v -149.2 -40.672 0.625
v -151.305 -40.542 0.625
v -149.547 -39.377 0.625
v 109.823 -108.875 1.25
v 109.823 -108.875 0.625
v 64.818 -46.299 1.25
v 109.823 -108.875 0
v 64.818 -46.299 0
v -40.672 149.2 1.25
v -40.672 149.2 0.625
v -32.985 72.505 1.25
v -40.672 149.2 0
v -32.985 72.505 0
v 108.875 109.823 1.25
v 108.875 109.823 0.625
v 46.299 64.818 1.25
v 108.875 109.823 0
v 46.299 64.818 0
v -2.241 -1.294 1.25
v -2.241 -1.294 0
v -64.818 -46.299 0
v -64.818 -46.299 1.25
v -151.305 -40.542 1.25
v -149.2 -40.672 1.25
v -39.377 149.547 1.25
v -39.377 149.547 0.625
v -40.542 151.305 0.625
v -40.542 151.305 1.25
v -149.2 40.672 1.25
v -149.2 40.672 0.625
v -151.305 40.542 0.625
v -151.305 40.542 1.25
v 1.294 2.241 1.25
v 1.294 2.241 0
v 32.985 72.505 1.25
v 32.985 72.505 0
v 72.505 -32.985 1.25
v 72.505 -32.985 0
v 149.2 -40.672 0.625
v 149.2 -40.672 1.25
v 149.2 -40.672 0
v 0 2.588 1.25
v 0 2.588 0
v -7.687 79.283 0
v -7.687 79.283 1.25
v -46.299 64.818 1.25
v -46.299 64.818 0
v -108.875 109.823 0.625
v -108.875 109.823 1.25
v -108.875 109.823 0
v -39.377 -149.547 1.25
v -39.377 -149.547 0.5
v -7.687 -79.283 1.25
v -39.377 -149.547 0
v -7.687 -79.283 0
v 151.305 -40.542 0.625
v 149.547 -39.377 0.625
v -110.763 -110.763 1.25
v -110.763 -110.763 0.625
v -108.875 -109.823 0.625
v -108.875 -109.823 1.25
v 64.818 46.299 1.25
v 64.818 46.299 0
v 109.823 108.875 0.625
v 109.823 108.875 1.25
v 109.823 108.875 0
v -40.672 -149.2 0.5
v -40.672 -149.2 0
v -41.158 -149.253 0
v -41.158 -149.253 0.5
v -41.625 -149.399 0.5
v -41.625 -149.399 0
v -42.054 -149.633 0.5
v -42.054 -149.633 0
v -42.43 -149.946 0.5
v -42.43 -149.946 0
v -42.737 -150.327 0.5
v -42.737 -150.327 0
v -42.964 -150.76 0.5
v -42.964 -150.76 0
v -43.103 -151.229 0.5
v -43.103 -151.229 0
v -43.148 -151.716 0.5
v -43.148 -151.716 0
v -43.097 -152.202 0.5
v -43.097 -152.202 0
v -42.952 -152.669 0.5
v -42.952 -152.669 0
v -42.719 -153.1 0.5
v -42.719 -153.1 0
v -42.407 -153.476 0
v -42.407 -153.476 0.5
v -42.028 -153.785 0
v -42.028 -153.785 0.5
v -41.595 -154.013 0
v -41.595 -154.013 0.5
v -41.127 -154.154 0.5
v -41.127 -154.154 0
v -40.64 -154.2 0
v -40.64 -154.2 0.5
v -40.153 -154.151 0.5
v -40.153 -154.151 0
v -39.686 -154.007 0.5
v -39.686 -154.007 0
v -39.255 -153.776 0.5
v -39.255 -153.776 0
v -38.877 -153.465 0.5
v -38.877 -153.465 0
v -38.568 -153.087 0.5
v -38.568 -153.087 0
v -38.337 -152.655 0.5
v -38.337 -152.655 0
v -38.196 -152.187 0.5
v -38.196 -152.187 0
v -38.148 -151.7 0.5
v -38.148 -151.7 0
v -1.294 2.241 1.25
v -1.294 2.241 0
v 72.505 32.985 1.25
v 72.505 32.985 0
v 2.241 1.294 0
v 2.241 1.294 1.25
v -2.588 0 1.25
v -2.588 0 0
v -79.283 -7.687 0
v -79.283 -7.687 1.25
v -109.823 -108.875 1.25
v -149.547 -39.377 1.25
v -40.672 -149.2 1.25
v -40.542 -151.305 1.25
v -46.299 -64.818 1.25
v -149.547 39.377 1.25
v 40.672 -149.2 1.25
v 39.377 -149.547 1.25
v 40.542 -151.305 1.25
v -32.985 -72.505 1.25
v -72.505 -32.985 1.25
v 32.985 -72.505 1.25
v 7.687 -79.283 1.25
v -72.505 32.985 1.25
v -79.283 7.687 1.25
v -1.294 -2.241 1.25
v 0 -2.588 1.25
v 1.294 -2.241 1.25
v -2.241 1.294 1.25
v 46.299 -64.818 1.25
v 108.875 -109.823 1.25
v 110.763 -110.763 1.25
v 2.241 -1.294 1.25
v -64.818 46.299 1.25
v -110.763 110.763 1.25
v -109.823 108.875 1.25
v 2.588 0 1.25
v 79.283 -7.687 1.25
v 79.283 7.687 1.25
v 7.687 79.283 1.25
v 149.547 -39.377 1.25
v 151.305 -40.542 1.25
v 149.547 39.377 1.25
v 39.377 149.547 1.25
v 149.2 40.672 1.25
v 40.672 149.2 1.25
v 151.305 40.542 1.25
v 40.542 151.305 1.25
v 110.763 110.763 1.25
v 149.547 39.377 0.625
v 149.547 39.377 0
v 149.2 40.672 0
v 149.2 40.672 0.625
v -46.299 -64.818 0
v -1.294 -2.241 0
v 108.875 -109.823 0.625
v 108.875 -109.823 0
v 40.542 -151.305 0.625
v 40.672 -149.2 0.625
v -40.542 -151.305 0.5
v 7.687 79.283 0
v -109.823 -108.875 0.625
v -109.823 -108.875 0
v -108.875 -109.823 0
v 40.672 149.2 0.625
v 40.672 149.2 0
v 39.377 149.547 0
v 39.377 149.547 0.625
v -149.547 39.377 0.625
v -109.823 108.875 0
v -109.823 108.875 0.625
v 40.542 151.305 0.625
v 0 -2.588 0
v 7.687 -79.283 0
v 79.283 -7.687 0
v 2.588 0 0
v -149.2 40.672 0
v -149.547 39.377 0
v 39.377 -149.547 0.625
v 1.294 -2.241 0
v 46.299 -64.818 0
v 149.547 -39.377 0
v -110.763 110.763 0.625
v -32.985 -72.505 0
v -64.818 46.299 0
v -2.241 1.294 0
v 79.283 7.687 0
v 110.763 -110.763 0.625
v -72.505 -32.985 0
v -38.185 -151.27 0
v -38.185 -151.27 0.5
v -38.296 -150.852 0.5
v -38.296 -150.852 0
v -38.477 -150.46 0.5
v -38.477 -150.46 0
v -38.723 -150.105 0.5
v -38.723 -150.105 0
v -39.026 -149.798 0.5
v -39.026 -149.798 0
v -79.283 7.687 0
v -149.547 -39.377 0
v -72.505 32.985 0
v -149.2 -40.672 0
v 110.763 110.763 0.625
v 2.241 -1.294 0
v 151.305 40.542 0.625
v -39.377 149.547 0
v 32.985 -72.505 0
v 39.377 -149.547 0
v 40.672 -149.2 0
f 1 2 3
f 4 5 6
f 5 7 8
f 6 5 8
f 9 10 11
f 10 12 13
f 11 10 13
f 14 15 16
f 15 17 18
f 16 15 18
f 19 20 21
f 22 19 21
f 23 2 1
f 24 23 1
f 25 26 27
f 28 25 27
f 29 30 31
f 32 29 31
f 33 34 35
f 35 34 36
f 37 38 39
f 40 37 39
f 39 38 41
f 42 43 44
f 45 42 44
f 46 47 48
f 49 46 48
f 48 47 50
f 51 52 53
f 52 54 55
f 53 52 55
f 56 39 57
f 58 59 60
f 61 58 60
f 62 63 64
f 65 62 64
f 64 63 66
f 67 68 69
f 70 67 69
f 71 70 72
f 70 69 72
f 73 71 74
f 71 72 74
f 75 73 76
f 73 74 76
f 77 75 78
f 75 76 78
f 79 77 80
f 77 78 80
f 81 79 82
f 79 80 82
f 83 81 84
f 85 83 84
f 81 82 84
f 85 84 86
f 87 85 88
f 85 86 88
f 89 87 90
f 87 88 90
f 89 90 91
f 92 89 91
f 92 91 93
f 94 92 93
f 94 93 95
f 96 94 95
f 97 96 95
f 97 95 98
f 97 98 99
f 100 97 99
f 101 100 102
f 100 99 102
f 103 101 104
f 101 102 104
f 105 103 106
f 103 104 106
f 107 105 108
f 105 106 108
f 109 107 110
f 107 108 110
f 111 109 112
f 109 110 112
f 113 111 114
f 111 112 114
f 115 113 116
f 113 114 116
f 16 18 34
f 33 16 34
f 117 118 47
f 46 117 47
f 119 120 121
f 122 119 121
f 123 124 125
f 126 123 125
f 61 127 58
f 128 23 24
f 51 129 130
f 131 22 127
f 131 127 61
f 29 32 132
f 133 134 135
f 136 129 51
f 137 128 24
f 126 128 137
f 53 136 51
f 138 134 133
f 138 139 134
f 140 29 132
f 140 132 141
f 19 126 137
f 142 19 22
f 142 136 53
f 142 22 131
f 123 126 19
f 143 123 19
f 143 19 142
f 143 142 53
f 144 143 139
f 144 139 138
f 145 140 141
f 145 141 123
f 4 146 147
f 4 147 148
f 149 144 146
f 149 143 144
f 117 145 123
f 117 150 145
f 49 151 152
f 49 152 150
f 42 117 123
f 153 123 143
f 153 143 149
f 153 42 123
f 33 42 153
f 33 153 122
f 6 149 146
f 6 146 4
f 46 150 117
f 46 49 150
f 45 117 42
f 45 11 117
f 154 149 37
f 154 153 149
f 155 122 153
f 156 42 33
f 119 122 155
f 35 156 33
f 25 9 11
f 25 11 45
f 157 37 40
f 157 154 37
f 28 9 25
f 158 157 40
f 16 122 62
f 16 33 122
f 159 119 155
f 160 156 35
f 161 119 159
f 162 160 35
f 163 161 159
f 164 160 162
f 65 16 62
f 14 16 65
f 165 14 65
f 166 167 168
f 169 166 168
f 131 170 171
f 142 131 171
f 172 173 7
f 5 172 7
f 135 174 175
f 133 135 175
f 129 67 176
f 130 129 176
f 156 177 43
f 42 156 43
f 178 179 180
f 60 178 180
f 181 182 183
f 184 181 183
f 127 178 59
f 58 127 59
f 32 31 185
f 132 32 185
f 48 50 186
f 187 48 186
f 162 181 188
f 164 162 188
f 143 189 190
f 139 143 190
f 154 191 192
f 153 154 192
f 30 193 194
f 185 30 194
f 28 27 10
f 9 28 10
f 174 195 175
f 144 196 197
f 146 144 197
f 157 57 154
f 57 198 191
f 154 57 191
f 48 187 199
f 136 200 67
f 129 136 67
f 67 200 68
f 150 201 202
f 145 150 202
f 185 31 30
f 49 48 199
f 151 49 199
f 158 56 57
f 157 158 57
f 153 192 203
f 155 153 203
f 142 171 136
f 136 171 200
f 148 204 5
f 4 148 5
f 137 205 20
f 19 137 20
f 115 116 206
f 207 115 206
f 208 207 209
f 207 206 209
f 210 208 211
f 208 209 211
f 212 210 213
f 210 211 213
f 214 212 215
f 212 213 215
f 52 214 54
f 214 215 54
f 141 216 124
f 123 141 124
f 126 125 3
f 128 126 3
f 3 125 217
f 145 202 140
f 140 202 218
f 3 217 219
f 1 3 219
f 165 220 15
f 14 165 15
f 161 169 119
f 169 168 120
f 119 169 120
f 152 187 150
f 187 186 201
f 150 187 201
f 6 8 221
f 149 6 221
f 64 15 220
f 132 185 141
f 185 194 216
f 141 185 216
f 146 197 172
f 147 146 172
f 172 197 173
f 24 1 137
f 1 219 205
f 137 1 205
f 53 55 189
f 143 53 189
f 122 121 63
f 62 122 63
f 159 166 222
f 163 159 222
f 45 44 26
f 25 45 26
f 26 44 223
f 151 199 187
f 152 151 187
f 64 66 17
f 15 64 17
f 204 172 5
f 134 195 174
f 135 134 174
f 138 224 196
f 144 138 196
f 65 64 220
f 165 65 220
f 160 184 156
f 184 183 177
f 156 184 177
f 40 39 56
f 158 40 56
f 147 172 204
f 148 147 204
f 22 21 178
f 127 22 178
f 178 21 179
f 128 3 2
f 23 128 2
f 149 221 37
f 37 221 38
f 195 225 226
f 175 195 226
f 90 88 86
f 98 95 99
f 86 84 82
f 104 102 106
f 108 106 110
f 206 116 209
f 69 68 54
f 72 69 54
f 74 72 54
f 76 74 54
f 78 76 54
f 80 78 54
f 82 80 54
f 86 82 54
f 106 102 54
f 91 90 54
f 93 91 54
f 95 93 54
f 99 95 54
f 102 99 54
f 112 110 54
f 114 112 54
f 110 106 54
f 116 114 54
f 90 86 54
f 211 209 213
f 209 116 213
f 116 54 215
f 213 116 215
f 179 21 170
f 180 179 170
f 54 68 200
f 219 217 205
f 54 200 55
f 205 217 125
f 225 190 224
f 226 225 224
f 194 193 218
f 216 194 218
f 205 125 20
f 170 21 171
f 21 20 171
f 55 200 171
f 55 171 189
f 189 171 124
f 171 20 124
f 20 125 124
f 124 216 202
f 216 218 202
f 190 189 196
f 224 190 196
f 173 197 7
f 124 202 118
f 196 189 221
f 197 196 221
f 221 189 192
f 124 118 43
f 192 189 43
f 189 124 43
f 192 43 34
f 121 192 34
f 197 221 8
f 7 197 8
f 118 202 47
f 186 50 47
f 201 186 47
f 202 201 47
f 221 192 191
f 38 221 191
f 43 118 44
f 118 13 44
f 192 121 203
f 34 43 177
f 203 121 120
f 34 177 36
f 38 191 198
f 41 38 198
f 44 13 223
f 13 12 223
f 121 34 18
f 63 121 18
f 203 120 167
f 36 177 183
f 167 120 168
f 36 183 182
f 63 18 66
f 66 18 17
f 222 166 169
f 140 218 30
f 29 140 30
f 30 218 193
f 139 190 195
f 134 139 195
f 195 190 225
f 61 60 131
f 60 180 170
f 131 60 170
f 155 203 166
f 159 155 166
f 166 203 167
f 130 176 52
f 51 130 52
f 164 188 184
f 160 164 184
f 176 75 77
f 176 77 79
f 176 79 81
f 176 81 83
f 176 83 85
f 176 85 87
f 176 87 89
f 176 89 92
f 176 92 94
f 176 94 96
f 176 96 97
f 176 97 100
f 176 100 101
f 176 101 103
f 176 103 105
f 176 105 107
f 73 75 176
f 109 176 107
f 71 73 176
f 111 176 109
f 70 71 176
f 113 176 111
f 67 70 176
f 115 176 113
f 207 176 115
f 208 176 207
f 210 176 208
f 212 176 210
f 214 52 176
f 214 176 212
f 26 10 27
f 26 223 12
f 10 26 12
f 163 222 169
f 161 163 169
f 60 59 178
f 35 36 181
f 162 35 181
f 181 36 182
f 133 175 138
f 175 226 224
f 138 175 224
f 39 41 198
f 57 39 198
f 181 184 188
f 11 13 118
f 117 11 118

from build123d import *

# Parameters (mm, degrees)
F0_DEPTH = 1.25
F4_DEPTH = 0.5
F1_DEPTH = 0.625


with BuildPart() as f0:
    # F2 (on Top) → F0 (new body)
    with BuildSketch(Plane.XY):
        with BuildLine():
            ThreePointArc((2.2414386804, -1.2940952255), (2.5, -0.6698729811), (2.588190451, 0))
            ThreePointArc((2.588190451, 0), (2.5, 0.6698729811), (2.2414386804, 1.2940952255))
            ThreePointArc((2.2414386804, 1.2940952255), (1.8301270189, 1.8301270189), (1.2940952255, 2.2414386804))
            ThreePointArc((1.2940952255, 2.2414386804), (0.6698729811, 2.5), (0, 2.588190451))
            ThreePointArc((0, 2.588190451), (-0.6698729811, 2.5), (-1.2940952255, 2.2414386804))
            ThreePointArc((-1.2940952255, 2.2414386804), (-1.8301270189, 1.8301270189), (-2.2414386804, 1.2940952255))
            ThreePointArc((-2.2414386804, 1.2940952255), (-2.5, 0.6698729811), (-2.588190451, 0))
            Line((-2.588190451, 0), (0, 0))
            Line((0, 0), (0, -2.588190451))
            ThreePointArc((0, -2.588190451), (0.6698729811, -2.5), (1.2940952255, -2.2414386804))
            ThreePointArc((1.2940952255, -2.2414386804), (1.8301270189, -1.8301270189), (2.2414386804, -1.2940952255))
        make_face()
        with BuildLine():
            Line((79.283469064, -7.6867534323), (2.588190451, 0))
            ThreePointArc((2.588190451, 0), (2.5, -0.6698729811), (2.2414386804, -1.2940952255))
            Line((2.2414386804, -1.2940952255), (72.5048750257, -32.984810787))
            Line((72.5048750257, -32.984810787), (149.2001536387, -40.6715642193))
            Line((149.2001536387, -40.6715642193), (151.3053811766, -40.5421546968))
            Line((151.3053811766, -40.5421546968), (149.5469054093, -39.3774689938))
            Line((149.5469054093, -39.3774689938), (79.283469064, -7.6867534323))
        make_face()
        with BuildLine():
            ThreePointArc((2.2414386804, 1.2940952255), (2.5, 0.6698729811), (2.588190451, 0))
            Line((2.588190451, 0), (79.283469064, 7.6867534323))
            Line((79.283469064, 7.6867534323), (149.5469054093, 39.3774689938))
            Line((149.5469054093, 39.3774689938), (151.3053811766, 40.5421546968))
            Line((151.3053811766, 40.5421546968), (149.2001536387, 40.6715642193))
            Line((149.2001536387, 40.6715642193), (72.5048750257, 32.984810787))
            Line((72.5048750257, 32.984810787), (2.2414386804, 1.2940952255))
        make_face()
        with BuildLine():
            ThreePointArc((1.2940952255, 2.2414386804), (1.8301270189, 1.8301270189), (2.2414386804, 1.2940952255))
            Line((2.2414386804, 1.2940952255), (64.8181215934, 46.298658277))
            Line((64.8181215934, 46.298658277), (109.8226846449, 108.87534119))
            Line((109.8226846449, 108.87534119), (110.7632264798, 110.7632264798))
            Line((110.7632264798, 110.7632264798), (108.87534119, 109.8226846449))
            Line((108.87534119, 109.8226846449), (46.298658277, 64.8181215934))
            Line((46.298658277, 64.8181215934), (1.2940952255, 2.2414386804))
        make_face()
        with BuildLine():
            Line((64.8181215934, -46.298658277), (2.2414386804, -1.2940952255))
            ThreePointArc((2.2414386804, -1.2940952255), (1.8301270189, -1.8301270189), (1.2940952255, -2.2414386804))
            Line((1.2940952255, -2.2414386804), (46.298658277, -64.8181215934))
            Line((46.298658277, -64.8181215934), (108.87534119, -109.8226846449))
            Line((108.87534119, -109.8226846449), (110.7632264798, -110.7632264798))
            Line((110.7632264798, -110.7632264798), (109.8226846449, -108.87534119))
            Line((109.8226846449, -108.87534119), (64.8181215934, -46.298658277))
        make_face()
        with BuildLine():
            ThreePointArc((0, 2.588190451), (0.6698729811, 2.5), (1.2940952255, 2.2414386804))
            Line((1.2940952255, 2.2414386804), (32.984810787, 72.5048750257))
            Line((32.984810787, 72.5048750257), (40.6715642193, 149.2001536387))
            Line((40.6715642193, 149.2001536387), (40.5421546968, 151.3053811766))
            Line((40.5421546968, 151.3053811766), (39.3774689938, 149.5469054093))
            Line((39.3774689938, 149.5469054093), (7.6867534323, 79.283469064))
            Line((7.6867534323, 79.283469064), (0, 2.588190451))
        make_face()
        with BuildLine():
            Line((32.984810787, -72.5048750257), (1.2940952255, -2.2414386804))
            ThreePointArc((1.2940952255, -2.2414386804), (0.6698729811, -2.5), (0, -2.588190451))
            Line((0, -2.588190451), (7.6867534323, -79.283469064))
            Line((7.6867534323, -79.283469064), (39.3774689938, -149.5469054093))
            Line((39.3774689938, -149.5469054093), (40.5421546968, -151.3053811766))
            Line((40.5421546968, -151.3053811766), (40.6715642193, -149.2001536387))
            Line((40.6715642193, -149.2001536387), (32.984810787, -72.5048750257))
        make_face()
        with BuildLine():
            ThreePointArc((-1.2940952255, 2.2414386804), (-0.6698729811, 2.5), (0, 2.588190451))
            Line((0, 2.588190451), (-7.6867534323, 79.283469064))
            Line((-7.6867534323, 79.283469064), (-39.3774689938, 149.5469054093))
            Line((-39.3774689938, 149.5469054093), (-40.5421546968, 151.3053811766))
            Line((-40.5421546968, 151.3053811766), (-40.6715642193, 149.2001536387))
            Line((-40.6715642193, 149.2001536387), (-32.984810787, 72.5048750257))
            Line((-32.984810787, 72.5048750257), (-1.2940952255, 2.2414386804))
        make_face()
        with BuildLine():
            Line((-7.6867534323, -79.283469064), (0, -2.588190451))
            ThreePointArc((0, -2.588190451), (-0.6698729811, -2.5), (-1.2940952255, -2.2414386804))
            Line((-1.2940952255, -2.2414386804), (-32.984810787, -72.5048750257))
            Line((-32.984810787, -72.5048750257), (-40.6715642193, -149.2001536387))
            Line((-40.6715642193, -149.2001536387), (-40.5421546968, -151.3053811766))
            Line((-40.5421546968, -151.3053811766), (-39.3774689938, -149.5469054093))
            Line((-39.3774689938, -149.5469054093), (-7.6867534323, -79.283469064))
        make_face()
        Polygon((-1.2940952255, -2.2414386804), (0, -2.588190451), (0, 0), align=None)
        with BuildLine():
            ThreePointArc((-1.2940952255, -2.2414386804), (-0.6698729811, -2.5), (0, -2.588190451))
            Line((0, -2.588190451), (-1.2940952255, -2.2414386804))
        make_face()
        with BuildLine():
            ThreePointArc((-2.2414386804, 1.2940952255), (-1.8301270189, 1.8301270189), (-1.2940952255, 2.2414386804))
            Line((-1.2940952255, 2.2414386804), (-46.298658277, 64.8181215934))
            Line((-46.298658277, 64.8181215934), (-108.87534119, 109.8226846449))
            Line((-108.87534119, 109.8226846449), (-110.7632264798, 110.7632264798))
            Line((-110.7632264798, 110.7632264798), (-109.8226846449, 108.87534119))
            Line((-109.8226846449, 108.87534119), (-64.8181215934, 46.298658277))
            Line((-64.8181215934, 46.298658277), (-2.2414386804, 1.2940952255))
        make_face()
        with BuildLine():
            Line((-46.298658277, -64.8181215934), (-1.2940952255, -2.2414386804))
            ThreePointArc((-1.2940952255, -2.2414386804), (-1.8301270189, -1.8301270189), (-2.2414386804, -1.2940952255))
            Line((-2.2414386804, -1.2940952255), (-64.8181215934, -46.298658277))
            Line((-64.8181215934, -46.298658277), (-109.8226846449, -108.87534119))
            Line((-109.8226846449, -108.87534119), (-110.7632264798, -110.7632264798))
            Line((-110.7632264798, -110.7632264798), (-108.87534119, -109.8226846449))
            Line((-108.87534119, -109.8226846449), (-46.298658277, -64.8181215934))
        make_face()
        Polygon((-2.2414386804, -1.2940952255), (-1.2940952255, -2.2414386804), (0, 0), align=None)
        with BuildLine():
            ThreePointArc((-2.2414386804, -1.2940952255), (-1.8301270189, -1.8301270189), (-1.2940952255, -2.2414386804))
            Line((-1.2940952255, -2.2414386804), (-2.2414386804, -1.2940952255))
        make_face()
        Polygon((-2.2414386804, -1.2940952255), (0, 0), (-2.588190451, 0), align=None)
        with BuildLine():
            ThreePointArc((-2.588190451, 0), (-2.5, 0.6698729811), (-2.2414386804, 1.2940952255))
            Line((-2.2414386804, 1.2940952255), (-72.5048750257, 32.984810787))
            Line((-72.5048750257, 32.984810787), (-149.2001536387, 40.6715642193))
            Line((-149.2001536387, 40.6715642193), (-151.3053811766, 40.5421546968))
            Line((-151.3053811766, 40.5421546968), (-149.5469054093, 39.3774689938))
            Line((-149.5469054093, 39.3774689938), (-79.283469064, 7.6867534323))
            Line((-79.283469064, 7.6867534323), (-2.588190451, 0))
        make_face()
        with BuildLine():
            Line((-72.5048750257, -32.984810787), (-2.2414386804, -1.2940952255))
            ThreePointArc((-2.2414386804, -1.2940952255), (-2.5, -0.6698729811), (-2.588190451, 0))
            Line((-2.588190451, 0), (-79.283469064, -7.6867534323))
            Line((-79.283469064, -7.6867534323), (-149.5469054093, -39.3774689938))
            Line((-149.5469054093, -39.3774689938), (-151.3053811766, -40.5421546968))
            Line((-151.3053811766, -40.5421546968), (-149.2001536387, -40.6715642193))
            Line((-149.2001536387, -40.6715642193), (-72.5048750257, -32.984810787))
        make_face()
        with BuildLine():
            ThreePointArc((-2.588190451, 0), (-2.5, -0.6698729811), (-2.2414386804, -1.2940952255))
            Line((-2.2414386804, -1.2940952255), (-2.588190451, 0))
        make_face()
    extrude(amount=F0_DEPTH)

    # F3 (on face) → F4 (join)
    with BuildSketch(Plane.XY):
        with BuildLine():
            ThreePointArc((-40.6715642193, -149.2001536387), (-42.407285452, -153.4761541969), (-38.1479036577, -151.7000416718))
            ThreePointArc((-38.1479036577, -151.7000416718), (-38.4769491833, -150.4603011061), (-39.3774689938, -149.5469054093))
            Line((-39.3774689938, -149.5469054093), (-40.5421546968, -151.3053811766))
            Line((-40.5421546968, -151.3053811766), (-40.6715642193, -149.2001536387))
        make_face()
        with BuildLine():
            Line((-40.5421546968, -151.3053811766), (-39.3774689938, -149.5469054093))
            ThreePointArc((-39.3774689938, -149.5469054093), (-40.000856045, -149.2852271061), (-40.6715642193, -149.2001536387))
            Line((-40.6715642193, -149.2001536387), (-40.5421546968, -151.3053811766))
        make_face()
    extrude(amount=F4_DEPTH)

    # F5 (on face) → F1 (cut)
    with BuildSketch(Plane(origin=(0, 0, 0), x_dir=(1, 0, 0), z_dir=(0, 0, -1))):
        Polygon((40.6715642193, 149.2001536387), (40.5421546968, 151.3053811766), (39.3774689938, 149.5469054093), align=None)
        Polygon((109.8226846449, 108.87534119), (110.7632264798, 110.7632264798), (108.87534119, 109.8226846449), align=None)
        Polygon((151.3053811766, 40.5421546968), (149.2001536387, 40.6715642193), (149.5469054093, 39.3774689938), align=None)
        Polygon((149.5469054093, -39.3774689938), (149.2001536387, -40.6715642193), (151.3053811766, -40.5421546968), align=None)
        Polygon((109.8226846449, -108.87534119), (108.87534119, -109.8226846449), (110.7632264798, -110.7632264798), align=None)
        Polygon((40.5421546968, -151.3053811766), (40.6715642193, -149.2001536387), (39.3774689938, -149.5469054093), align=None)
        Polygon((-40.5421546968, -151.3053811766), (-39.3774689938, -149.5469054093), (-40.6715642193, -149.2001536387), align=None)
        Polygon((-109.8226846449, -108.87534119), (-110.7632264798, -110.7632264798), (-108.87534119, -109.8226846449), align=None)
        Polygon((-149.2001536387, -40.6715642193), (-149.5469054093, -39.3774689938), (-151.3053811766, -40.5421546968), align=None)
        Polygon((-149.5469054093, 39.3774689938), (-149.2001536387, 40.6715642193), (-151.3053811766, 40.5421546968), align=None)
        Polygon((-109.8226846449, 108.87534119), (-108.87534119, 109.8226846449), (-110.7632264798, 110.7632264798), align=None)
    extrude(amount=-F1_DEPTH, mode=Mode.SUBTRACT)


solid = f0.part
